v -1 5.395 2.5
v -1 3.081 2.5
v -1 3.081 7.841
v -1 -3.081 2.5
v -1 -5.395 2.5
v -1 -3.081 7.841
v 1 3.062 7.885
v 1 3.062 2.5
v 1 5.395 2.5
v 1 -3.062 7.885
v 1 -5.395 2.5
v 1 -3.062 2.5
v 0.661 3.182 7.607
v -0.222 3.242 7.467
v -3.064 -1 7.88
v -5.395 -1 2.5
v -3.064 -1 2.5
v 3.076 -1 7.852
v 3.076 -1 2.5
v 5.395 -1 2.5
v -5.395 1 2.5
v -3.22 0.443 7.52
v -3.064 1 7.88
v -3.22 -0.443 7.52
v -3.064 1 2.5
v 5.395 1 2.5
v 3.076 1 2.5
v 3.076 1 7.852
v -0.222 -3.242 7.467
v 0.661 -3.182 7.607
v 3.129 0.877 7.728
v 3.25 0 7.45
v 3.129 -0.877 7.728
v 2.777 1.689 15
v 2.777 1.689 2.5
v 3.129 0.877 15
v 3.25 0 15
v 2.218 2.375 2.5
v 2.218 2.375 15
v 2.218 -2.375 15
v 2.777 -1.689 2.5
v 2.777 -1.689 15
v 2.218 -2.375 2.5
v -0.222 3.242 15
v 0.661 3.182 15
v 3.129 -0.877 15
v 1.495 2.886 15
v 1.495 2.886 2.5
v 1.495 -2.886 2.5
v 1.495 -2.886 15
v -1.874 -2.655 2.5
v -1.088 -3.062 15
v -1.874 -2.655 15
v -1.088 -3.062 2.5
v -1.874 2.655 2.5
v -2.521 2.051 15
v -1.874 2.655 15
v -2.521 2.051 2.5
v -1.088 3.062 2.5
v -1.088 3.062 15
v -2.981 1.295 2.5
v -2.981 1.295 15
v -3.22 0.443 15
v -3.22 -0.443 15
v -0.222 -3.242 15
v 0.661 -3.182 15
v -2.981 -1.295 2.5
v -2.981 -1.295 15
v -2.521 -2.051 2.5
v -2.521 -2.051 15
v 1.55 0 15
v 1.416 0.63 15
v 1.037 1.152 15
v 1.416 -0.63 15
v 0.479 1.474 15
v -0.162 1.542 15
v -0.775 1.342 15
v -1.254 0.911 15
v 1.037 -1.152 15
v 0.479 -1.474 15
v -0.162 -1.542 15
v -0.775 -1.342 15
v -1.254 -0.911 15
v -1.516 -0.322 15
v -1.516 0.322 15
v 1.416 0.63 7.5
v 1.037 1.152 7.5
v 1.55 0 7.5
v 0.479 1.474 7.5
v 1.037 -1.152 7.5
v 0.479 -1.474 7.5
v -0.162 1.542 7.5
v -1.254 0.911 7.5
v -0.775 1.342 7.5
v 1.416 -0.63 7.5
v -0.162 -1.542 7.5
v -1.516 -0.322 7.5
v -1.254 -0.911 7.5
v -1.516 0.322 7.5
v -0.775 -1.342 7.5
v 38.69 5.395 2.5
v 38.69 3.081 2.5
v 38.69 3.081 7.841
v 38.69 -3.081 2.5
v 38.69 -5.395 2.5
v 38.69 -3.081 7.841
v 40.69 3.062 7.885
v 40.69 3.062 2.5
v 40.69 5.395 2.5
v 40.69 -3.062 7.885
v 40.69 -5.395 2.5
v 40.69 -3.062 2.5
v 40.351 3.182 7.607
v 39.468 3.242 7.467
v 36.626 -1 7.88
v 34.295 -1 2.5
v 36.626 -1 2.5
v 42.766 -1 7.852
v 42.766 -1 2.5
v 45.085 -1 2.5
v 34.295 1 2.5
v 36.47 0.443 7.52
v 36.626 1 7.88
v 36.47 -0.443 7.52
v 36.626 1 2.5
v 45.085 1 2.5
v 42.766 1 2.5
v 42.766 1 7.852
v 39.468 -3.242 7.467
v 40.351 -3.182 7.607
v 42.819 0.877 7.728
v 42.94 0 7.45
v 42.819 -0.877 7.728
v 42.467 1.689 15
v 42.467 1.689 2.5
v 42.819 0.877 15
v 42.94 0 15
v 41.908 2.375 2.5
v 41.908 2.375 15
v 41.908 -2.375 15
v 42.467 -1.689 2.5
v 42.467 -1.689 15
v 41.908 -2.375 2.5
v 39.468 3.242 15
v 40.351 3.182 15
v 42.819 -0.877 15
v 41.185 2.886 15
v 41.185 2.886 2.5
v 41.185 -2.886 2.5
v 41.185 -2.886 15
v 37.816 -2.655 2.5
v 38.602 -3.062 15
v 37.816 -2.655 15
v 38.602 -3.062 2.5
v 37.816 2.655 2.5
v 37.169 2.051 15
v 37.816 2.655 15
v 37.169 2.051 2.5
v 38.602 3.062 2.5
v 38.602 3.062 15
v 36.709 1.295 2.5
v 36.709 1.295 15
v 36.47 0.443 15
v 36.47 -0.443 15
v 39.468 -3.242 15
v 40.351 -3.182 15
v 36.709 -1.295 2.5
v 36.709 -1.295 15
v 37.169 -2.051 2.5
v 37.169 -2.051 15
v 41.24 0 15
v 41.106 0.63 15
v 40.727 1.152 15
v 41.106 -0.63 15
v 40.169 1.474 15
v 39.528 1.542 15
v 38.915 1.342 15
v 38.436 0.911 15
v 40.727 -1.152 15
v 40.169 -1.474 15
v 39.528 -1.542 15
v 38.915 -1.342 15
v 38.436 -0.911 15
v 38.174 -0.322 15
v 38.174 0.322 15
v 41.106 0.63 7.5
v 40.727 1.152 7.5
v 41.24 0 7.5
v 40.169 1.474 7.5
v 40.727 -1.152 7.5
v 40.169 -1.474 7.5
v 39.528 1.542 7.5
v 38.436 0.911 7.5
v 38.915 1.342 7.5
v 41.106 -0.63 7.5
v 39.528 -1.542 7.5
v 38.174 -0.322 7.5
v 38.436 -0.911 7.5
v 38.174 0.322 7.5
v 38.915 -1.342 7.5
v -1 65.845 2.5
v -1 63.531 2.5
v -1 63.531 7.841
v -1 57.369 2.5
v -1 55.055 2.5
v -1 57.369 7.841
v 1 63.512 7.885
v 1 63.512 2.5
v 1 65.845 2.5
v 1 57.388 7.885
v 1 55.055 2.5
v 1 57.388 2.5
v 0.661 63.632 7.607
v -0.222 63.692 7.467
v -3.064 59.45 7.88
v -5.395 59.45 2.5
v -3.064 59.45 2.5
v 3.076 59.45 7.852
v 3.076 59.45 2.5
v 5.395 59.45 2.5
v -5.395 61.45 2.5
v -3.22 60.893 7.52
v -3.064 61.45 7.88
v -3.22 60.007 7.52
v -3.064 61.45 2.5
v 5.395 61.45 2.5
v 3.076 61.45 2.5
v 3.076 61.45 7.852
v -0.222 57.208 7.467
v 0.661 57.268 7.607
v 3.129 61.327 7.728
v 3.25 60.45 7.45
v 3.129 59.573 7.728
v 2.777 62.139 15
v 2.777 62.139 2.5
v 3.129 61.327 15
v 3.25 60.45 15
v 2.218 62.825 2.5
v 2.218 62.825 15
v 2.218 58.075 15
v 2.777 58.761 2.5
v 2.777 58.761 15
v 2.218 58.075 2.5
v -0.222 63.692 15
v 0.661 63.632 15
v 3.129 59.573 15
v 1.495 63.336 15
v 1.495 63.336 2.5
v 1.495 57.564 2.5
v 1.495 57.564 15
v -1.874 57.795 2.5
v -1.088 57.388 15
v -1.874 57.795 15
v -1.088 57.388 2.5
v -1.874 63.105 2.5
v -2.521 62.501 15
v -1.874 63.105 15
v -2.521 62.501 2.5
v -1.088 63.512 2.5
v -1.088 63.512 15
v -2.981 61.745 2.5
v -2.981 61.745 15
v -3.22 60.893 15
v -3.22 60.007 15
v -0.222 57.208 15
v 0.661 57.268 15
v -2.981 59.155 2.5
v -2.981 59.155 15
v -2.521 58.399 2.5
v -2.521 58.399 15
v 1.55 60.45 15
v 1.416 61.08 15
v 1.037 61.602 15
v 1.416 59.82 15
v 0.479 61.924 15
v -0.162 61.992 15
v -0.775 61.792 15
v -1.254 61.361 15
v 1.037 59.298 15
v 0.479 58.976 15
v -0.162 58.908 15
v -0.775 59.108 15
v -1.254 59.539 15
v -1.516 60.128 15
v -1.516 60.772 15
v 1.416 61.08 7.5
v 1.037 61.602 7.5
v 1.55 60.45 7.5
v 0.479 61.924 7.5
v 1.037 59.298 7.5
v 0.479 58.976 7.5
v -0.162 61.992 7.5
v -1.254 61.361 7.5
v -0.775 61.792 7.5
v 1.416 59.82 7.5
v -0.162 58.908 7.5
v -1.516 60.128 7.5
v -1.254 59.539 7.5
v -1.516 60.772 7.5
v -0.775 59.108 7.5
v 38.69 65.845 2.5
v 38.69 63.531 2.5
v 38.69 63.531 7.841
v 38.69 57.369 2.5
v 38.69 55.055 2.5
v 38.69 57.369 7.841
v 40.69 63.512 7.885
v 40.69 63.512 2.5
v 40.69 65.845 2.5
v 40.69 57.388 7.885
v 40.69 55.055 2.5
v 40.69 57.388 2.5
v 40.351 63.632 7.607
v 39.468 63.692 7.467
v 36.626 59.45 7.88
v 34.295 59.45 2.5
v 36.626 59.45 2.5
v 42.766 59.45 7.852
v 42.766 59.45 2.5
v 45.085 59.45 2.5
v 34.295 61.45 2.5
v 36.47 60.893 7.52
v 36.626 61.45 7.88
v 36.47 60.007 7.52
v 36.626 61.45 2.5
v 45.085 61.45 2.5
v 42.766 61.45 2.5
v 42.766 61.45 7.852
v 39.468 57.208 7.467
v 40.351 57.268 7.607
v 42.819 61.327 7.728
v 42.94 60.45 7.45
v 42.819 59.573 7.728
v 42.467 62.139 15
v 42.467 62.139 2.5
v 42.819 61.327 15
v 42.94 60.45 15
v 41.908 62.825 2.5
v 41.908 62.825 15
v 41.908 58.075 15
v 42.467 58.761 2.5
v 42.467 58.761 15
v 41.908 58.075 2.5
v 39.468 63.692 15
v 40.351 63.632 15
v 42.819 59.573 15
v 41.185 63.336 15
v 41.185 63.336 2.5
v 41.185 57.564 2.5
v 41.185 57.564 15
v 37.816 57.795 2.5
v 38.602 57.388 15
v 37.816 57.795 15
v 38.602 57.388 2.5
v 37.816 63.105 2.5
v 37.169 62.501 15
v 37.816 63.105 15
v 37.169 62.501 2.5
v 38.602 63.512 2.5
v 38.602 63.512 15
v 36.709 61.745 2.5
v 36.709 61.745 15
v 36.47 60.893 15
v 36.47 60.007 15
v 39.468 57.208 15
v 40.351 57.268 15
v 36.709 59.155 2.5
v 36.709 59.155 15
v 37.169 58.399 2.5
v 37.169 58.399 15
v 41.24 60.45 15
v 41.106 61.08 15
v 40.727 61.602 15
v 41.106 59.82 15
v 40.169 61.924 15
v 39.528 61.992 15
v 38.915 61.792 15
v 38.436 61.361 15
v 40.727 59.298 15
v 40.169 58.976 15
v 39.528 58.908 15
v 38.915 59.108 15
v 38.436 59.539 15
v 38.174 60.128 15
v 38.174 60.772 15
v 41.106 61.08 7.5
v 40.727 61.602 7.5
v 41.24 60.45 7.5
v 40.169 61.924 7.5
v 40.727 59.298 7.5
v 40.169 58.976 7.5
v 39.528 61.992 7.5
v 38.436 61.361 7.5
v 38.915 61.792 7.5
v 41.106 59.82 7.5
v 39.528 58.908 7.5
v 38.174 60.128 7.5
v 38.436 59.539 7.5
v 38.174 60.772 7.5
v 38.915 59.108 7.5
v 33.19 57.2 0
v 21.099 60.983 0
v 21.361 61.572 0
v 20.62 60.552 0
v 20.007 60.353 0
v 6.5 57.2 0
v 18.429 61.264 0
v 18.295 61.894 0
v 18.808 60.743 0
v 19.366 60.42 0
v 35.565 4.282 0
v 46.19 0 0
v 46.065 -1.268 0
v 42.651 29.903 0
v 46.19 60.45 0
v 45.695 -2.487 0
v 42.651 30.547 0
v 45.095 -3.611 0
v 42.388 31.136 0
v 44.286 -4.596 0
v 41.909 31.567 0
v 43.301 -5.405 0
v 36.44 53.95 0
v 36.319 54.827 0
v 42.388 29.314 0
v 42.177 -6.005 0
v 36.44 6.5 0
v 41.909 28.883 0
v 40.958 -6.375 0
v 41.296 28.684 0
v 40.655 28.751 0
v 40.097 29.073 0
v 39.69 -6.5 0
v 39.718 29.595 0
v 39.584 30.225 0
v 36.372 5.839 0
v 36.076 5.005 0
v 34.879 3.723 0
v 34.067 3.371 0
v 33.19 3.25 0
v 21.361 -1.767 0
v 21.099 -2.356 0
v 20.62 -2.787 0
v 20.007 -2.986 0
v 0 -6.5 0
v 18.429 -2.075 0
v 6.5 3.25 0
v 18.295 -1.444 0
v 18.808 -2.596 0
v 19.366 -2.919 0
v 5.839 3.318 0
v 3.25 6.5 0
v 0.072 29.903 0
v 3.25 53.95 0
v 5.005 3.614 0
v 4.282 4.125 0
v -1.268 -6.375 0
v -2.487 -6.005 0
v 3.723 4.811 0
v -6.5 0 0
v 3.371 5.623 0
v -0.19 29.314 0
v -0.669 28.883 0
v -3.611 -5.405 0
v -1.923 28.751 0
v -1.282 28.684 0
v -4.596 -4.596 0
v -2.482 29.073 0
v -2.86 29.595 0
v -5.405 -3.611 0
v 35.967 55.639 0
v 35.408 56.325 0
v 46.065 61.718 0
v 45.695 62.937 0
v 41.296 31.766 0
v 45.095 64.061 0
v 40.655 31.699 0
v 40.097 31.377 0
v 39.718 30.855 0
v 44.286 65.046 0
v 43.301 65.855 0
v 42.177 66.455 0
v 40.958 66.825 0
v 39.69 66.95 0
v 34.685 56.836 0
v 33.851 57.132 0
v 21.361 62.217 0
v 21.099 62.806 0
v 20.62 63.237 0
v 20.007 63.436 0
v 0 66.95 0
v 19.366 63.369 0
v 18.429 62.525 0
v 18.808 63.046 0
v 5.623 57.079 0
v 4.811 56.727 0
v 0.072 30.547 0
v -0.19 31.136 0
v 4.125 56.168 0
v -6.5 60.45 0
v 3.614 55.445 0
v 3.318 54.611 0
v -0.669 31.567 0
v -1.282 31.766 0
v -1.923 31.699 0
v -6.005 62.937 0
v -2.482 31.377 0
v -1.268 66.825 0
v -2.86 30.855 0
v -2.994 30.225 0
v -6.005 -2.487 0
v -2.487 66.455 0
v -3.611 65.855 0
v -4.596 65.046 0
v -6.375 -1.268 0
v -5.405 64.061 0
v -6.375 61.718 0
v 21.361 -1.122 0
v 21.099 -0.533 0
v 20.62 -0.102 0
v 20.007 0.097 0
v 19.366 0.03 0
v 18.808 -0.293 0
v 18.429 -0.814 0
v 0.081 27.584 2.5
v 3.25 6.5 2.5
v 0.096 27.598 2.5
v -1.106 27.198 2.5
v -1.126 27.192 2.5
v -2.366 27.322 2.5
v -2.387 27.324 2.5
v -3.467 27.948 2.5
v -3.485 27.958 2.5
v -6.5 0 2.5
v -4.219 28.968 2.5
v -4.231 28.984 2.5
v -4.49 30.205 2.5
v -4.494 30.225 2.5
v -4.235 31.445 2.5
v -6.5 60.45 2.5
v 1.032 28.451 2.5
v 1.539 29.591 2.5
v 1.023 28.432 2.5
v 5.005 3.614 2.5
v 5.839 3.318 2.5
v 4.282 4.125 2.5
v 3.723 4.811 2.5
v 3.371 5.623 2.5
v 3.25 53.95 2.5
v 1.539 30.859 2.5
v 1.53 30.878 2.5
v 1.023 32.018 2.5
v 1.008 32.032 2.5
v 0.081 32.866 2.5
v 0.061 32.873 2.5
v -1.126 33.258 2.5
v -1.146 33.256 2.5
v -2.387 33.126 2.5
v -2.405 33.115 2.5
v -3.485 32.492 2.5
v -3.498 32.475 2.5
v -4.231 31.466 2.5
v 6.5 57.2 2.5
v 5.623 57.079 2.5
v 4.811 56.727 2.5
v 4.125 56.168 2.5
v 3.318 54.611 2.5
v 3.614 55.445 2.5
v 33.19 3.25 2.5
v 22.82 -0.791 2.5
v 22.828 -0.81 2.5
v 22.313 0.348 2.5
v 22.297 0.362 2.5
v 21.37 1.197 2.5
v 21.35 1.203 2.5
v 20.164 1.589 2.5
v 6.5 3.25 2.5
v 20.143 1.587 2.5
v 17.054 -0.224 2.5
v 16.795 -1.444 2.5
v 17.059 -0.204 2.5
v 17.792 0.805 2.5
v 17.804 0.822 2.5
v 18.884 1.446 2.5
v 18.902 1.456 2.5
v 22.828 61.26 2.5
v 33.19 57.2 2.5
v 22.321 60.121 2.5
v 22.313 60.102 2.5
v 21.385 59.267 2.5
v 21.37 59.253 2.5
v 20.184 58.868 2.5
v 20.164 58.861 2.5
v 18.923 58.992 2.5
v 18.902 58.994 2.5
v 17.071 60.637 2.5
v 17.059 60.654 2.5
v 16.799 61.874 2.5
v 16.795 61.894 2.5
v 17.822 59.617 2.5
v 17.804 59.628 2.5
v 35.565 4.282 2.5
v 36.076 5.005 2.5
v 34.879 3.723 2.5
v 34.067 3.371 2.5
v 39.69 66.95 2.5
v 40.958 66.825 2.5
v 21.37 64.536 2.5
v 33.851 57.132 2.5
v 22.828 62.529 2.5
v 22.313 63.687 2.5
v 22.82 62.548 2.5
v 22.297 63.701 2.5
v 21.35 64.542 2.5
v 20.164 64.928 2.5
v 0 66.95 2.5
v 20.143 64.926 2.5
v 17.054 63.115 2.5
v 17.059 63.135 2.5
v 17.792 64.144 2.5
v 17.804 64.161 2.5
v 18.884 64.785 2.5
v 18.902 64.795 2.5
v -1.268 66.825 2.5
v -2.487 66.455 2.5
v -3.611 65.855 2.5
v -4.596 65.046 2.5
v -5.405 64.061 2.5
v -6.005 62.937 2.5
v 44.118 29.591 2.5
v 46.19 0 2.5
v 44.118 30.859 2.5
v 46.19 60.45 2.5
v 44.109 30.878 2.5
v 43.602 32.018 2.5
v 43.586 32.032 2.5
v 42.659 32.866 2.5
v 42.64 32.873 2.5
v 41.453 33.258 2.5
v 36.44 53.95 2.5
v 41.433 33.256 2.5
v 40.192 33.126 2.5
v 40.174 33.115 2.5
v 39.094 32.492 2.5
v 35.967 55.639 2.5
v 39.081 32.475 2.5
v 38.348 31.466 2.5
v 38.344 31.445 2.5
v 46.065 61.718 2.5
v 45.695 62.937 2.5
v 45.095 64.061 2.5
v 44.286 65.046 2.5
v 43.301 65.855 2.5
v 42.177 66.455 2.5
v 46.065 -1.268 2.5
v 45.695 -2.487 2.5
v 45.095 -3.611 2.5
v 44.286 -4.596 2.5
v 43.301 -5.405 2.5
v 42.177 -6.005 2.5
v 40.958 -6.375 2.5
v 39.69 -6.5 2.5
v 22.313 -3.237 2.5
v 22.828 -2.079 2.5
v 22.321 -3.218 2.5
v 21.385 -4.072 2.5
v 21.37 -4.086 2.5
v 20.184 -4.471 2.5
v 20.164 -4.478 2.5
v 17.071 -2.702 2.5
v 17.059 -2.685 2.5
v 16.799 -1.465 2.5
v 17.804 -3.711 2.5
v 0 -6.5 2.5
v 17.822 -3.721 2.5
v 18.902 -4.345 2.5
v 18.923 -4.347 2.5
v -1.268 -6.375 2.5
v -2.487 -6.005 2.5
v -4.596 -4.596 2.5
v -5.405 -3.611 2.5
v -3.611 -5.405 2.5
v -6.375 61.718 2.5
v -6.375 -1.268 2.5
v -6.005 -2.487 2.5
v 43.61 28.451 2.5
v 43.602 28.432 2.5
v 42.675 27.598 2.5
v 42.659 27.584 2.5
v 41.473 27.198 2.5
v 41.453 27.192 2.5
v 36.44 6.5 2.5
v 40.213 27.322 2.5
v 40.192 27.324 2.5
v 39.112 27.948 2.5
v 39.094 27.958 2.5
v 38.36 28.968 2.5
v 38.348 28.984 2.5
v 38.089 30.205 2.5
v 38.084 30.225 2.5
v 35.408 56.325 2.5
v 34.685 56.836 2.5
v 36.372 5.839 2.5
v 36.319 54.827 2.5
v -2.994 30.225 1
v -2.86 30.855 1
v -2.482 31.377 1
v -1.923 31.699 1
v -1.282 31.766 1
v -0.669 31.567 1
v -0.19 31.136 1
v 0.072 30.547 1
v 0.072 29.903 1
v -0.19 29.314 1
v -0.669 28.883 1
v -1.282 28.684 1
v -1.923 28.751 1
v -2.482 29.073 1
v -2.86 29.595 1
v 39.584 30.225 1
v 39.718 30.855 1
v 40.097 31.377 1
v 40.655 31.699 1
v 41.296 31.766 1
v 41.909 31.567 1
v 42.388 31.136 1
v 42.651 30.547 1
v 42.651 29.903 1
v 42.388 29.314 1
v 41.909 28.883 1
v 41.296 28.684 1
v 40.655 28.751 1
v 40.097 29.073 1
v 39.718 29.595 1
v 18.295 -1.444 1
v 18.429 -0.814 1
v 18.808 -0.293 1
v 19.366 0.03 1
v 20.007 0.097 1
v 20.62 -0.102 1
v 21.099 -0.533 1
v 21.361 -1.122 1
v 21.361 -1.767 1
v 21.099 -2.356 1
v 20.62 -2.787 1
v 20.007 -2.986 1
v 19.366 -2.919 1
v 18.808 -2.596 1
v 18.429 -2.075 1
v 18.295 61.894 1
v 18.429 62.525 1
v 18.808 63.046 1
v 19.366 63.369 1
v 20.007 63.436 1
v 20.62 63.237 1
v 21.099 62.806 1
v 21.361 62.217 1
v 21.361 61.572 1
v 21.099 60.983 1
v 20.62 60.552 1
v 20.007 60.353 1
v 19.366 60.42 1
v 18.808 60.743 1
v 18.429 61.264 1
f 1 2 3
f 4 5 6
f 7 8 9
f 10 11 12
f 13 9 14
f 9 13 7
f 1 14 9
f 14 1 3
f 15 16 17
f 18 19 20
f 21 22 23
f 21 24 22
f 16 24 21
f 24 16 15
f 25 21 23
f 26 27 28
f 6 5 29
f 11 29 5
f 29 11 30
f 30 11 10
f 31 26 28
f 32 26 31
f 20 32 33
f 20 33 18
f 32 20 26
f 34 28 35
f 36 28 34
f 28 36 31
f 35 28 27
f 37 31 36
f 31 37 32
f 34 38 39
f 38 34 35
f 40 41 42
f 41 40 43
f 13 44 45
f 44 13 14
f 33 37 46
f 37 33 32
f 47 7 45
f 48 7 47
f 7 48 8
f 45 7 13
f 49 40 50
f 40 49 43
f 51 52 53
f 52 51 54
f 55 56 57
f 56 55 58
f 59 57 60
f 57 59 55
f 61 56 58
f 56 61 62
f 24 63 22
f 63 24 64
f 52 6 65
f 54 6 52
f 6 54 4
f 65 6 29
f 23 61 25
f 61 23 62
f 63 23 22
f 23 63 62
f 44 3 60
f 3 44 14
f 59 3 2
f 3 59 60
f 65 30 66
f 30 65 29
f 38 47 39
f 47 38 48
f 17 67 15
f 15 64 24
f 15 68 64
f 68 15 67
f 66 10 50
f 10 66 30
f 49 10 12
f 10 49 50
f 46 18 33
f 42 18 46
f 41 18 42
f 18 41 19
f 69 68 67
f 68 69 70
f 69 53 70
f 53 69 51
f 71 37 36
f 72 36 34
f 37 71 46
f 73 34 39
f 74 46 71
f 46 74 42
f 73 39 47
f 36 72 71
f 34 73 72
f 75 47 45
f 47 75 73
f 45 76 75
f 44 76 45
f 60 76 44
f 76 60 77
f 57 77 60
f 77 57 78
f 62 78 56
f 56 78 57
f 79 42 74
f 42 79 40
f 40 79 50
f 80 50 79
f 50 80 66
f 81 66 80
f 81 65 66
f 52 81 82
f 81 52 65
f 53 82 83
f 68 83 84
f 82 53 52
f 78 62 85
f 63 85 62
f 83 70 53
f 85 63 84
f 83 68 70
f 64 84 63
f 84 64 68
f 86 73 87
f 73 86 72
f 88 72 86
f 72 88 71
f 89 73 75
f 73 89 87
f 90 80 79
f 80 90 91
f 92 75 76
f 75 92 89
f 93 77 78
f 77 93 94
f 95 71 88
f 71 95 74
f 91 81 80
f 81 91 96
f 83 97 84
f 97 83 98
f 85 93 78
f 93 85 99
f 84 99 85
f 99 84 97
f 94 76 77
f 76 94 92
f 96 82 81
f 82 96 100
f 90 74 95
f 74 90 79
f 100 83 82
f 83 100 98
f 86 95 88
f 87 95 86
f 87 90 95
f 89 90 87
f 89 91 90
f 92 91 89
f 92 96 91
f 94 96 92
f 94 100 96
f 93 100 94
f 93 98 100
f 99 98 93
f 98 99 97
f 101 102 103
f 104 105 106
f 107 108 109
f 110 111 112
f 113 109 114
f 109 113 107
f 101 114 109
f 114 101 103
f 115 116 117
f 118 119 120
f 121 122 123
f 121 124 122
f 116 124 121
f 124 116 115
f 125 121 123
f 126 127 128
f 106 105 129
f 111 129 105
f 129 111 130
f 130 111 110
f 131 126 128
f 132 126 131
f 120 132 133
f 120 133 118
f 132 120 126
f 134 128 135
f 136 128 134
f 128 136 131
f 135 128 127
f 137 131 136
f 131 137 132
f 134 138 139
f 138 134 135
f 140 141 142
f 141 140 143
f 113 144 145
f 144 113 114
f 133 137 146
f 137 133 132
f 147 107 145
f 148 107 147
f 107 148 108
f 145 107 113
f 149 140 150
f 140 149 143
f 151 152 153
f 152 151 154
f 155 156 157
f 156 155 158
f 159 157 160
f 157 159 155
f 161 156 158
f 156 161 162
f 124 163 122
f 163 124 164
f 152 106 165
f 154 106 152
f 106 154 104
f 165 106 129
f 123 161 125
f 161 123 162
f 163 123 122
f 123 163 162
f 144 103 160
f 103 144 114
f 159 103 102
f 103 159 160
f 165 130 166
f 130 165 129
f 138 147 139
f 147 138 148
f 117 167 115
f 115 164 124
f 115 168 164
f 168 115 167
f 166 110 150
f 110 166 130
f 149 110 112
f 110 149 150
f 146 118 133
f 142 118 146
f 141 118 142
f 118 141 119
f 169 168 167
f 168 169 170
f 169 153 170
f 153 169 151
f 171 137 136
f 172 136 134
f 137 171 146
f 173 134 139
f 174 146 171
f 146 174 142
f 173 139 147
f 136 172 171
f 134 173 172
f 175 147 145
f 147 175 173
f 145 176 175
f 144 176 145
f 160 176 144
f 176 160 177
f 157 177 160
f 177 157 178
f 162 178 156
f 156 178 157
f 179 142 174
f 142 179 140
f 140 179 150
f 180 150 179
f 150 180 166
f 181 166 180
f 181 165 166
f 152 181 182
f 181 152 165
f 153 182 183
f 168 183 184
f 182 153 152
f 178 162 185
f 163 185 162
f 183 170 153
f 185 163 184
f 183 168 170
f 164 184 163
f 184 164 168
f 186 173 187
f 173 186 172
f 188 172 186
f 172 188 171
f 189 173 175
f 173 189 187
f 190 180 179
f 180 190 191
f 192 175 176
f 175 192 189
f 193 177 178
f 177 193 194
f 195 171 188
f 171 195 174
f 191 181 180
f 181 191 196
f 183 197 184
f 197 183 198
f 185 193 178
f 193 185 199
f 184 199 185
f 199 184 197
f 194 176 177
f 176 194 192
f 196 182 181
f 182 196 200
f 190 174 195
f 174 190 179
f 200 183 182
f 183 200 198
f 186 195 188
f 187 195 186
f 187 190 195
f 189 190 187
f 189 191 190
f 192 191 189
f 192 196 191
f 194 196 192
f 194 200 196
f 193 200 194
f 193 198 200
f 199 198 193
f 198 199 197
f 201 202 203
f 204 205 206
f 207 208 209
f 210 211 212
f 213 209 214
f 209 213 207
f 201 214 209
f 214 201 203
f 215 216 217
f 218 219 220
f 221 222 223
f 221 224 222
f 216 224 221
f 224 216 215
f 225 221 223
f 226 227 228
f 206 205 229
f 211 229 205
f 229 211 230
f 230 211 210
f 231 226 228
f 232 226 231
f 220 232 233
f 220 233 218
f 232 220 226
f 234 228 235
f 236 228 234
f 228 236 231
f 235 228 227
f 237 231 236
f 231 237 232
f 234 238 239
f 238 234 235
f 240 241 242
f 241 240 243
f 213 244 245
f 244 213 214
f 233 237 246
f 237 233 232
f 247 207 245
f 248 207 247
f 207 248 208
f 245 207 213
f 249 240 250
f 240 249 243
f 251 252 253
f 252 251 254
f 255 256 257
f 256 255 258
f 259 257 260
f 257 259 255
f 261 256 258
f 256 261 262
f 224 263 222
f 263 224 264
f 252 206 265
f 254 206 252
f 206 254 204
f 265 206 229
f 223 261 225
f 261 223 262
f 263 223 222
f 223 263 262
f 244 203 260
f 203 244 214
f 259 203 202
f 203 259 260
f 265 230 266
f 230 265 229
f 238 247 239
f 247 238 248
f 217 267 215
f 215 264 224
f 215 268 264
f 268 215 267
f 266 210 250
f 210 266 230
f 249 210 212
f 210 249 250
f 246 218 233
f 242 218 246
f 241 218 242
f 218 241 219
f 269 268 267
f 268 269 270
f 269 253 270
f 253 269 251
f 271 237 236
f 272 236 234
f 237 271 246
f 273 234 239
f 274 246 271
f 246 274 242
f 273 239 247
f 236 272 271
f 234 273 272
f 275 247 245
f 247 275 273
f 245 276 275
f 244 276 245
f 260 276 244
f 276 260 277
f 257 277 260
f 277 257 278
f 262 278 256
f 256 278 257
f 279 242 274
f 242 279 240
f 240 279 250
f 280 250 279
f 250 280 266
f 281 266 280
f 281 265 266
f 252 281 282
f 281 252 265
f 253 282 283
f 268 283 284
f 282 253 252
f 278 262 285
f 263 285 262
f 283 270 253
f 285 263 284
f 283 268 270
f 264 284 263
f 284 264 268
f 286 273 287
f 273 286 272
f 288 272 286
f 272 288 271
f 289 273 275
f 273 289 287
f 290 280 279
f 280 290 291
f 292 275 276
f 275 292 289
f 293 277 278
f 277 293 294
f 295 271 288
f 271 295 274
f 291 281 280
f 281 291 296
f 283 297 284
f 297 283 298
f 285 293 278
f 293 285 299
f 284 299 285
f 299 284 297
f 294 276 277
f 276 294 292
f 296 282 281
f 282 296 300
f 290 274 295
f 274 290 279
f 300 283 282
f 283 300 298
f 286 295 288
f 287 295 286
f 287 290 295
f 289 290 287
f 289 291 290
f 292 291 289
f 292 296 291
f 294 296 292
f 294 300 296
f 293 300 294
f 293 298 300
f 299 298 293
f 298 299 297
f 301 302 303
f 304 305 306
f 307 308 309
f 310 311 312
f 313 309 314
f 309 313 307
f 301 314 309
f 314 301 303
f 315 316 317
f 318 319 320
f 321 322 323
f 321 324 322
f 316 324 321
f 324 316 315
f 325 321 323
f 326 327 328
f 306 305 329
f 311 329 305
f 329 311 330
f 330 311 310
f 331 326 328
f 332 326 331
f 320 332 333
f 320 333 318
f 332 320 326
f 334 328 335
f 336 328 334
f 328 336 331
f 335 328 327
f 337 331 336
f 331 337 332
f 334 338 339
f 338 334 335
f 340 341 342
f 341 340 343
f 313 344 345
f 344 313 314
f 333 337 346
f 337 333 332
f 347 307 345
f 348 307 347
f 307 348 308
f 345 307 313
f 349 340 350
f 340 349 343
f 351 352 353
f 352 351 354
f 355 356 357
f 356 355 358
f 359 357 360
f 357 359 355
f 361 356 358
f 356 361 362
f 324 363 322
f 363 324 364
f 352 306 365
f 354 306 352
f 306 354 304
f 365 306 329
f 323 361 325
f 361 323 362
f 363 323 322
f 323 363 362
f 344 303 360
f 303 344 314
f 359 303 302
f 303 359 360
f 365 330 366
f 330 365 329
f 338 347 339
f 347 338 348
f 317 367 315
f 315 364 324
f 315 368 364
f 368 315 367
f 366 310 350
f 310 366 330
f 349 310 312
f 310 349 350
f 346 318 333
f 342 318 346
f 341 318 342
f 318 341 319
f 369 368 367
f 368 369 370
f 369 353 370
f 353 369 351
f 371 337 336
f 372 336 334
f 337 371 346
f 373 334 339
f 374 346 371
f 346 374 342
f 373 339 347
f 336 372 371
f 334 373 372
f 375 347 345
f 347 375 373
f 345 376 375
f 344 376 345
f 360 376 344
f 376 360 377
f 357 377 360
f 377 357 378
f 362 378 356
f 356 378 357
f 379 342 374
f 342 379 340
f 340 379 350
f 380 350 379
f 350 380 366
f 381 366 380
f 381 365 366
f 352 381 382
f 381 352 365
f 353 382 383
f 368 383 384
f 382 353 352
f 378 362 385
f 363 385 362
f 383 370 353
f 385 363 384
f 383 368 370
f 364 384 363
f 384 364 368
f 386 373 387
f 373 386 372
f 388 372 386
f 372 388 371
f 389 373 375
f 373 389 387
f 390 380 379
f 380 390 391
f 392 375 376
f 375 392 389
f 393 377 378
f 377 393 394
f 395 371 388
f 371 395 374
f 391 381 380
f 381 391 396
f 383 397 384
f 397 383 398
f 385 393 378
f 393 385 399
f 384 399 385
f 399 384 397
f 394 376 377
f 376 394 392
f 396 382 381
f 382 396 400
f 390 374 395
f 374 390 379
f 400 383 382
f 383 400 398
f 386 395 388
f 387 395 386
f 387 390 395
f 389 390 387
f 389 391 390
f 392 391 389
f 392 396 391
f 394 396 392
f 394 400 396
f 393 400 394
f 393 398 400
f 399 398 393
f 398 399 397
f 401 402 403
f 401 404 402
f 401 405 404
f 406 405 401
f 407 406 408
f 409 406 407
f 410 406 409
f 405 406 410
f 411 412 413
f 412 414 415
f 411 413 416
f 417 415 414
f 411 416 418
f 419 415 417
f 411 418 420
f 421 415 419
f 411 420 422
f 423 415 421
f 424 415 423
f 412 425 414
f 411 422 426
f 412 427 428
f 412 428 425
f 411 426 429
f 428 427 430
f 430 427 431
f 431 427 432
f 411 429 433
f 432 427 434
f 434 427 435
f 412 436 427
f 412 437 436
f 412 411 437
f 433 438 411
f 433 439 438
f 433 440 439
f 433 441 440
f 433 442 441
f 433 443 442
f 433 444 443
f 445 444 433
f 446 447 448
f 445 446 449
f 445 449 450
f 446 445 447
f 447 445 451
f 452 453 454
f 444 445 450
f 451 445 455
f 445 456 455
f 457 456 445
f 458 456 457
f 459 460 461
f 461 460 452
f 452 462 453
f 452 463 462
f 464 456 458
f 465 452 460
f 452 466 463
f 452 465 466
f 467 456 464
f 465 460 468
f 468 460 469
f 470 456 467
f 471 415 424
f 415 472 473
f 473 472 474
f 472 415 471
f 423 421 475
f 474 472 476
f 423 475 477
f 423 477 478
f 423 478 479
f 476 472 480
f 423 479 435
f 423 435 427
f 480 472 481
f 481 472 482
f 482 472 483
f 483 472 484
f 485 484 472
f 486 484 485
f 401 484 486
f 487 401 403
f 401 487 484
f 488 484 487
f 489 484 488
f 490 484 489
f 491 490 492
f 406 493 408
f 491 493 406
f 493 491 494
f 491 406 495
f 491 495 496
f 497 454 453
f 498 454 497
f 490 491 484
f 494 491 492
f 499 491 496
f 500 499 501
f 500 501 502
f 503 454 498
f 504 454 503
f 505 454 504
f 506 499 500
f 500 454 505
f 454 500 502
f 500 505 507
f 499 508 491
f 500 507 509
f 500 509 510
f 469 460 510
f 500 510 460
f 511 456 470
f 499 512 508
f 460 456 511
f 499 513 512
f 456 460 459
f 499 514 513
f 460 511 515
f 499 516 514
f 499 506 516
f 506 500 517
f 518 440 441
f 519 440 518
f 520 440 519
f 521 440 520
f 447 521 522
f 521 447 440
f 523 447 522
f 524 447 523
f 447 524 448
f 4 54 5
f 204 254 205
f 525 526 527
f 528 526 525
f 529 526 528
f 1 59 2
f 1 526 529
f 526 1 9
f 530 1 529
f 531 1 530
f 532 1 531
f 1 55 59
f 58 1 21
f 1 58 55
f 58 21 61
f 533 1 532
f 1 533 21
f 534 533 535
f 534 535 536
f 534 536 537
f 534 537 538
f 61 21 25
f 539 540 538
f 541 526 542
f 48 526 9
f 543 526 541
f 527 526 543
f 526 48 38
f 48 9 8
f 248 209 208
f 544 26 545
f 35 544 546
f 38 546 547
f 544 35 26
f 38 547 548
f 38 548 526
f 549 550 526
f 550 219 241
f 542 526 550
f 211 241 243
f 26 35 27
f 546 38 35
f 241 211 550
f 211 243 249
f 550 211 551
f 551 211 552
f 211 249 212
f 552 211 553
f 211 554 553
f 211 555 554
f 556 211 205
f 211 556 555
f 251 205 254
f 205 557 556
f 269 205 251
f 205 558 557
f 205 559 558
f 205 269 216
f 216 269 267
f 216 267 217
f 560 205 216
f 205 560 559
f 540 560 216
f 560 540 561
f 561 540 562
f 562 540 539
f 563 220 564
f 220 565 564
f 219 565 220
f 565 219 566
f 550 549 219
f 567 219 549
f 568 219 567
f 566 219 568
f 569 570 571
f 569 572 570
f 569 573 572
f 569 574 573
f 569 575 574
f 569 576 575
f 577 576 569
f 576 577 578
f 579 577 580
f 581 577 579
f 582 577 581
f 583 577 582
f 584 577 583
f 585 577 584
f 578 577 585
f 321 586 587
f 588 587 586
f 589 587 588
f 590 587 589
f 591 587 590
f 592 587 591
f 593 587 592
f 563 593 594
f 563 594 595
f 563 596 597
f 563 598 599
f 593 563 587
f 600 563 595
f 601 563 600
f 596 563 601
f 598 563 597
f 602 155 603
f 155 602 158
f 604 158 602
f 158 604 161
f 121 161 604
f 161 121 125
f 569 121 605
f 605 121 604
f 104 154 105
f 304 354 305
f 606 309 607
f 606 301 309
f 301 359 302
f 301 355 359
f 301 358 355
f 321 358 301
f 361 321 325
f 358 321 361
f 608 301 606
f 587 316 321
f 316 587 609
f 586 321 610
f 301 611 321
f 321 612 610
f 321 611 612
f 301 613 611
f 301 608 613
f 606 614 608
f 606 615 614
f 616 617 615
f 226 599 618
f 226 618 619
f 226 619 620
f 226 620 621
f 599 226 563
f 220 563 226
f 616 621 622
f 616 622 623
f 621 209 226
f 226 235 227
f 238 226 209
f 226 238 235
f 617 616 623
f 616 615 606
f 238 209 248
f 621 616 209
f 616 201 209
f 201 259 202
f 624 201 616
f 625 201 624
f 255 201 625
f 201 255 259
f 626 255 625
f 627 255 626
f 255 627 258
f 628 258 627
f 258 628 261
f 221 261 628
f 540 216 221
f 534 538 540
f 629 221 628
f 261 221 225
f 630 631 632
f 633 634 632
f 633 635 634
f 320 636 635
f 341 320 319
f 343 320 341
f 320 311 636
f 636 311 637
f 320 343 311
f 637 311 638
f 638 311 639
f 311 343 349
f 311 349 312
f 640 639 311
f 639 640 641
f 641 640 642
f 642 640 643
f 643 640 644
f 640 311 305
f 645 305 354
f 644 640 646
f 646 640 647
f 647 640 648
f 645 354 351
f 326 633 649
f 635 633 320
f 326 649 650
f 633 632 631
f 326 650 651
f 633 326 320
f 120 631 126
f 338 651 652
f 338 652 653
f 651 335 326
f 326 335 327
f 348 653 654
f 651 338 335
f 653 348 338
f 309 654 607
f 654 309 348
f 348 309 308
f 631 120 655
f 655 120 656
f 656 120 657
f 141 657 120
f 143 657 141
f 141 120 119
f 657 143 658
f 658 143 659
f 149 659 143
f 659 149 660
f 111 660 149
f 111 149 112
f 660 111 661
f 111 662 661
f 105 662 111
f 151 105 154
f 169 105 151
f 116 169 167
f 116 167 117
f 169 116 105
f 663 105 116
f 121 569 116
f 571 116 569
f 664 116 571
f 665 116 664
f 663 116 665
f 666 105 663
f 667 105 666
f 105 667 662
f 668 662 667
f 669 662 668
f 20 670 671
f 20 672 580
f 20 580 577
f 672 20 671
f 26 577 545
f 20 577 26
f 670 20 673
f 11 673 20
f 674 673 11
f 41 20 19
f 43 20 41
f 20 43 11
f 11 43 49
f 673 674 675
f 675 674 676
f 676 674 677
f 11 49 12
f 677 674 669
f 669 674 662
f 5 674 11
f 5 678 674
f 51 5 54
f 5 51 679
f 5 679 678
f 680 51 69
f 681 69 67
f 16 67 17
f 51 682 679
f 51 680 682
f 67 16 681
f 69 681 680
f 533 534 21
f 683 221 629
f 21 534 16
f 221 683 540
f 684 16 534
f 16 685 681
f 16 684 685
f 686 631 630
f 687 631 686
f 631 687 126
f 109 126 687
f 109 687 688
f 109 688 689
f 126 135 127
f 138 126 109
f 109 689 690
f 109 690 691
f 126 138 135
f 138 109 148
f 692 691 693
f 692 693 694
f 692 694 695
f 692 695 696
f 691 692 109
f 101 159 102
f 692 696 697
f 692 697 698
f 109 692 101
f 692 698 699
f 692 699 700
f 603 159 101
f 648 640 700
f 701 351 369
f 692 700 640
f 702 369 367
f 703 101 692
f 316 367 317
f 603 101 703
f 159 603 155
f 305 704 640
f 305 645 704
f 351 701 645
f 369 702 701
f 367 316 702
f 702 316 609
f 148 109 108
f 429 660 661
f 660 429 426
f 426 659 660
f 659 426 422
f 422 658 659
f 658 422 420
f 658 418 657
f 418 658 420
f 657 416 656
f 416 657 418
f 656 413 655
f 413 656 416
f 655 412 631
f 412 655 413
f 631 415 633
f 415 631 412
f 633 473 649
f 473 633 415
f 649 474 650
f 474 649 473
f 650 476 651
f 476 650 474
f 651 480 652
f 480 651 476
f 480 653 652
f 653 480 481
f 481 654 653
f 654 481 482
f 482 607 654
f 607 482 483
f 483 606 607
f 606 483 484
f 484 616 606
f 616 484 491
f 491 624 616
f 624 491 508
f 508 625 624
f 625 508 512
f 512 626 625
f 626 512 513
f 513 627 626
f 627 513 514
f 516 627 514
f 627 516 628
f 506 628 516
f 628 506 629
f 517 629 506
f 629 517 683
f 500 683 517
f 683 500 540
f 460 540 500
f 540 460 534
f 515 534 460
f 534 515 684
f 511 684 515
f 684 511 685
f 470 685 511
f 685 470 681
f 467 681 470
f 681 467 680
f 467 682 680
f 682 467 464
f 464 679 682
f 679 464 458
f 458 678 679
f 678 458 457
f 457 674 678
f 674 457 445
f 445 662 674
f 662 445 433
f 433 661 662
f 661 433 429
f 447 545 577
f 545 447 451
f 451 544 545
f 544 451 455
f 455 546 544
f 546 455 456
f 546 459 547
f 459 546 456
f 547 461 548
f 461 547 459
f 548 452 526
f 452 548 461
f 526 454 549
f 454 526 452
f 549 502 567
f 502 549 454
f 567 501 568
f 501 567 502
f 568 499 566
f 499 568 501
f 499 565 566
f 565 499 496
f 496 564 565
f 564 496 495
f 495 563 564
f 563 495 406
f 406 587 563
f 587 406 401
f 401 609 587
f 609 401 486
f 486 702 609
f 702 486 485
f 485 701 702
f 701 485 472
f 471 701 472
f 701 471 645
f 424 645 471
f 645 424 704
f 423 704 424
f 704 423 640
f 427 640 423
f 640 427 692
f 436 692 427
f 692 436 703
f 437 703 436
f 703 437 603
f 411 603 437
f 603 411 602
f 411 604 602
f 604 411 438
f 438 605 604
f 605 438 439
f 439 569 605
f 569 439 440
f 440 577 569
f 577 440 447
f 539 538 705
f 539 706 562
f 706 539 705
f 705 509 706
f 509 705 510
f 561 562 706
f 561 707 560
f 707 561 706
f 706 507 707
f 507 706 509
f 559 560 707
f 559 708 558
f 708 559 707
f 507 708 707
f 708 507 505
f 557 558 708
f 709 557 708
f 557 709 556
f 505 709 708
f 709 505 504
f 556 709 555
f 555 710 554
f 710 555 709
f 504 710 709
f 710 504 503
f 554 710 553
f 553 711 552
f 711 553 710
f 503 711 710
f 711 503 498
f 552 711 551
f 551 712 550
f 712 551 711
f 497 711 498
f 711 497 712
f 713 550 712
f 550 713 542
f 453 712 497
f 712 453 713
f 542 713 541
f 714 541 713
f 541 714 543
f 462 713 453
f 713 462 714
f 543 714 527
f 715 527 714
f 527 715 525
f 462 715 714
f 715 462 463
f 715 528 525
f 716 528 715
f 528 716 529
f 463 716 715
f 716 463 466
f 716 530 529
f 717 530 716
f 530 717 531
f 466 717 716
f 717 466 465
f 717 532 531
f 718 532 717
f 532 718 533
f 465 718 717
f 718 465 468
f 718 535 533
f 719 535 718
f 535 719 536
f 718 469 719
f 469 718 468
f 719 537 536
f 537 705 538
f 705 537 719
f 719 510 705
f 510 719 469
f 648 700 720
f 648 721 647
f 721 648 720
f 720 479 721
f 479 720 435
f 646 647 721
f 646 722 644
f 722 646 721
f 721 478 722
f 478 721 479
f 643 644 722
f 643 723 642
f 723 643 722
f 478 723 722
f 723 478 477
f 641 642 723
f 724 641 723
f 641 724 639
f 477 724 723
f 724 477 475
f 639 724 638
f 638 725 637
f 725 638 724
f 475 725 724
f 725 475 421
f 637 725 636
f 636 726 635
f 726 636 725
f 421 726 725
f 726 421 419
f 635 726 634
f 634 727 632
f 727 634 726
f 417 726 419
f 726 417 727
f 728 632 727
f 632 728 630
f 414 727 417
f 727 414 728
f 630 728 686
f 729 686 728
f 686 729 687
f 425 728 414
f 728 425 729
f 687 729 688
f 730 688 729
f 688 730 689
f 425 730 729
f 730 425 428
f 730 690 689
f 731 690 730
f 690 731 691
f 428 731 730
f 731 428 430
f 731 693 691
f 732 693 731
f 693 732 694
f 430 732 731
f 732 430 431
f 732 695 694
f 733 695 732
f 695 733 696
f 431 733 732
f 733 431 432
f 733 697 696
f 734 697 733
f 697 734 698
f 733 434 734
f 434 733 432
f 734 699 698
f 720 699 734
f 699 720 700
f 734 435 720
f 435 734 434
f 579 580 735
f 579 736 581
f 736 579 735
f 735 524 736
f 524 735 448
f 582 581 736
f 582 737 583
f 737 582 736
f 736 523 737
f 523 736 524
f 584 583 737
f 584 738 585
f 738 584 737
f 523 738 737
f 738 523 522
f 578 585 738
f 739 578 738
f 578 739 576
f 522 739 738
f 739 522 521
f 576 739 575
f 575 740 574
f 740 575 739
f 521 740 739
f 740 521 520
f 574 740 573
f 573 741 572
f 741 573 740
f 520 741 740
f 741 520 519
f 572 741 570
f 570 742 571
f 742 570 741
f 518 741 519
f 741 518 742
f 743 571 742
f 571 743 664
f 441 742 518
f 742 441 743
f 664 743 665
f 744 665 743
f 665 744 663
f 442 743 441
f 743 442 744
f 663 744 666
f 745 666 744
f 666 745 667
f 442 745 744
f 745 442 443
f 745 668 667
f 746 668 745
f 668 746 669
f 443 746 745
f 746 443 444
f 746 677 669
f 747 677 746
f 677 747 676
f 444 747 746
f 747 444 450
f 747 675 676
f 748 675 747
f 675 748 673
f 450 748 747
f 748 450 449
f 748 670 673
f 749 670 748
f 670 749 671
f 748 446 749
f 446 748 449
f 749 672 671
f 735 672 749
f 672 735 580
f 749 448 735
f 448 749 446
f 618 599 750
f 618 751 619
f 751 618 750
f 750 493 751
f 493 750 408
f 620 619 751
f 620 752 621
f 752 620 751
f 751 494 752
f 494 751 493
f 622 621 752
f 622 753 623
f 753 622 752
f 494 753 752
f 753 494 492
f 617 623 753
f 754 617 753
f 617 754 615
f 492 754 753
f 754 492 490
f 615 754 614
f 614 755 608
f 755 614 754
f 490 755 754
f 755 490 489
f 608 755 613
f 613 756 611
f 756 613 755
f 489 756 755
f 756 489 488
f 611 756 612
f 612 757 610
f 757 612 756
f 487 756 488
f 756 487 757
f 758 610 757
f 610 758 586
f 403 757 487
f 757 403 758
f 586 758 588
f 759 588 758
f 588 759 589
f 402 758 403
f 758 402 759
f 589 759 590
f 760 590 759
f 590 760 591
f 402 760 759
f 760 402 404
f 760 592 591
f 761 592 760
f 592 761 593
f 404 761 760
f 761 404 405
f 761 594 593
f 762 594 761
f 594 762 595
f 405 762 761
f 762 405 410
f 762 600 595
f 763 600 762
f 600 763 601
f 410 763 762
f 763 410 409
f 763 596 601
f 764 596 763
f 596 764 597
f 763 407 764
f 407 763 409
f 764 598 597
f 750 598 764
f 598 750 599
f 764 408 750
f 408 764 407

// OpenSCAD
//------------------------------------------------------------------
/*

4 Pillar PCB Mount

*/
//------------------------------------------------------------------
/* [Global] */

/*[General]*/
mount_width = 39.69;
mount_length = 60.45;
mount_height = 15.00;
mount_base_z = 2.5;
mount_hole_diameter = 3.1;
pillar_diameter = 6.5;
pillar_hole_diameter = 3.1;

/* [Hidden] */
//------------------------------------------------------------------

// small tweak to avoid differencing artifacts
epsilon = 0.05;

// control the number of facets on cylinders
facet_epsilon = 0.03;
function facets(r) = 180 / acos(1 - (facet_epsilon / r));

// rounded polygons
module rounded(r=1) {
  offset(r=r, $fn=facets(r)) offset(r=-r, $fn=facets(r)) children(0);
}

// filleted polygons
module filleted(r=1) {
  offset(r=-r, $fn=facets(r)) render() offset(r=r, $fn=facets(r)) children(0);
}

//------------------------------------------------------------------
// Mounting pillar with support webs

// single web
module pillar_web(
  web_height,
  web_radius,
  web_width
) {
  h = web_height;
  r = web_radius;
  w = web_width;
  points = [
    [0,0],
    [r,0],
    [0,h],
  ];
  rotate([90,0,0]) translate([0,0,-w/2]) linear_extrude(height=w) polygon(points=points);
}

// multiple webs
module pillar_webs(
  number_webs,
  web_height,
  web_radius,
  web_width
) {
  theta = 360 / number_webs;
  for (i = [1:number_webs]) {
    rotate([0,0,i * theta]) pillar_web(web_height, web_radius, web_width);
  }
}

// pillar
module pillar(
  pillar_height,
  pillar_radius
) {
  h = pillar_height;
  r = pillar_radius;
  cylinder(h=h, r=r, $fn=facets(r));
}

module pillar_hole(
  pillar_height,
  hole_depth,
  hole_radius
) {
  h = hole_depth + epsilon;
  r = hole_radius;
  z_ofs = pillar_height - hole_depth;
  translate([0,0,z_ofs]) cylinder(h=h, r=r, $fn=facets(r));
}

// pillar with webs
module webbed_pillar(
  pillar_height,
  pillar_radius,
  hole_depth,
  hole_radius,
  number_webs,
  web_height,
  web_radius,
  web_width,
) {
  intersection () {
    difference() {
      union() {
        pillar(pillar_height, pillar_radius);
        pillar_webs(number_webs, web_height, web_radius, web_width);
      }
      pillar_hole(pillar_height, hole_depth, hole_radius);
    }
    // Cut off any part of the webs that protrude from the
    // top of the pillar.
    cylinder(r = web_radius * 2, h = pillar_height);
  }
}

//------------------------------------------------------------------

// countersunk hole
module hole_countersunk(
  length,
  radius,
) {
  l = length;
  r = radius;
  if (r > l) {
    points = [
      [0, 0],
      [(2 * r) - l, 0],
      [2 * r, l],
      [0, l]
    ];
    rotate_extrude($fn=facets(r)) polygon(points=points);
  } else {
    points = [
      [0, 0],
      [r, 0],
      [r, l - r],
      [2 * r, l],
      [0, l]
    ];
    rotate_extrude($fn=facets(r)) polygon(points=points);
  }
}

//------------------------------------------------------------------

module mount_pillar() {
  z = mount_height - mount_base_z + epsilon;
  z_ofs = mount_base_z - epsilon;
  translate([0,0,z_ofs]) webbed_pillar(
    pillar_height = z,
    pillar_radius = pillar_diameter / 2,
    hole_depth = mount_height / 2,
    hole_radius = pillar_hole_diameter / 2,
    number_webs = 4,
    web_height = mount_height / 1.2,
    web_radius = pillar_diameter / 1.2,
    web_width = 2
  );
}

module pcb_mount_hole() {
  h = mount_base_z + (2 * epsilon);
  r = mount_hole_diameter / 2;
  translate([0,0,-epsilon])hole_countersunk(h, r);
}

module mount_base_2d() {
  w = mount_width;
  l = mount_length;
  points = [
    [0,0],
    [w,0],
    [w,l],
    [0,l],
  ];
  polygon(points=points);
}

//------------------------------------------------------------------

module pcb_mount_base() {
  r0 = pillar_diameter;
  r1 = r0 / 2.0;
  h = mount_base_z;
  linear_extrude(height = h) difference() {
    offset(r=r0, $fn=facets(r0)) mount_base_2d();
    rounded(r=r1) offset(r=-r1, $fn=facets(r1)) mount_base_2d();
  }
}

module pcb_mount_pillars() {
  w = mount_width;
  l = mount_length;
  translate([0,0]) mount_pillar();
  translate([w,0]) mount_pillar();
  translate([0,l]) mount_pillar();
  translate([w,l]) mount_pillar();
}

module pcb_mount_holes() {
  w = mount_width;
  l = mount_length;
  ofs = pillar_diameter / 4.5;
  y_mid = l/2;
  x_mid = w/2;
  translate([-ofs,y_mid]) pcb_mount_hole();
  translate([w+ofs, y_mid]) pcb_mount_hole();
  translate([x_mid,-ofs]) pcb_mount_hole();
  translate([x_mid,l+ofs]) pcb_mount_hole();
}

//------------------------------------------------------------------

module pcb_mount() {
  difference() {
    union() {
      pcb_mount_base();
      pcb_mount_pillars();
    }
    pcb_mount_holes();
  }
}

pcb_mount();

//------------------------------------------------------------------
